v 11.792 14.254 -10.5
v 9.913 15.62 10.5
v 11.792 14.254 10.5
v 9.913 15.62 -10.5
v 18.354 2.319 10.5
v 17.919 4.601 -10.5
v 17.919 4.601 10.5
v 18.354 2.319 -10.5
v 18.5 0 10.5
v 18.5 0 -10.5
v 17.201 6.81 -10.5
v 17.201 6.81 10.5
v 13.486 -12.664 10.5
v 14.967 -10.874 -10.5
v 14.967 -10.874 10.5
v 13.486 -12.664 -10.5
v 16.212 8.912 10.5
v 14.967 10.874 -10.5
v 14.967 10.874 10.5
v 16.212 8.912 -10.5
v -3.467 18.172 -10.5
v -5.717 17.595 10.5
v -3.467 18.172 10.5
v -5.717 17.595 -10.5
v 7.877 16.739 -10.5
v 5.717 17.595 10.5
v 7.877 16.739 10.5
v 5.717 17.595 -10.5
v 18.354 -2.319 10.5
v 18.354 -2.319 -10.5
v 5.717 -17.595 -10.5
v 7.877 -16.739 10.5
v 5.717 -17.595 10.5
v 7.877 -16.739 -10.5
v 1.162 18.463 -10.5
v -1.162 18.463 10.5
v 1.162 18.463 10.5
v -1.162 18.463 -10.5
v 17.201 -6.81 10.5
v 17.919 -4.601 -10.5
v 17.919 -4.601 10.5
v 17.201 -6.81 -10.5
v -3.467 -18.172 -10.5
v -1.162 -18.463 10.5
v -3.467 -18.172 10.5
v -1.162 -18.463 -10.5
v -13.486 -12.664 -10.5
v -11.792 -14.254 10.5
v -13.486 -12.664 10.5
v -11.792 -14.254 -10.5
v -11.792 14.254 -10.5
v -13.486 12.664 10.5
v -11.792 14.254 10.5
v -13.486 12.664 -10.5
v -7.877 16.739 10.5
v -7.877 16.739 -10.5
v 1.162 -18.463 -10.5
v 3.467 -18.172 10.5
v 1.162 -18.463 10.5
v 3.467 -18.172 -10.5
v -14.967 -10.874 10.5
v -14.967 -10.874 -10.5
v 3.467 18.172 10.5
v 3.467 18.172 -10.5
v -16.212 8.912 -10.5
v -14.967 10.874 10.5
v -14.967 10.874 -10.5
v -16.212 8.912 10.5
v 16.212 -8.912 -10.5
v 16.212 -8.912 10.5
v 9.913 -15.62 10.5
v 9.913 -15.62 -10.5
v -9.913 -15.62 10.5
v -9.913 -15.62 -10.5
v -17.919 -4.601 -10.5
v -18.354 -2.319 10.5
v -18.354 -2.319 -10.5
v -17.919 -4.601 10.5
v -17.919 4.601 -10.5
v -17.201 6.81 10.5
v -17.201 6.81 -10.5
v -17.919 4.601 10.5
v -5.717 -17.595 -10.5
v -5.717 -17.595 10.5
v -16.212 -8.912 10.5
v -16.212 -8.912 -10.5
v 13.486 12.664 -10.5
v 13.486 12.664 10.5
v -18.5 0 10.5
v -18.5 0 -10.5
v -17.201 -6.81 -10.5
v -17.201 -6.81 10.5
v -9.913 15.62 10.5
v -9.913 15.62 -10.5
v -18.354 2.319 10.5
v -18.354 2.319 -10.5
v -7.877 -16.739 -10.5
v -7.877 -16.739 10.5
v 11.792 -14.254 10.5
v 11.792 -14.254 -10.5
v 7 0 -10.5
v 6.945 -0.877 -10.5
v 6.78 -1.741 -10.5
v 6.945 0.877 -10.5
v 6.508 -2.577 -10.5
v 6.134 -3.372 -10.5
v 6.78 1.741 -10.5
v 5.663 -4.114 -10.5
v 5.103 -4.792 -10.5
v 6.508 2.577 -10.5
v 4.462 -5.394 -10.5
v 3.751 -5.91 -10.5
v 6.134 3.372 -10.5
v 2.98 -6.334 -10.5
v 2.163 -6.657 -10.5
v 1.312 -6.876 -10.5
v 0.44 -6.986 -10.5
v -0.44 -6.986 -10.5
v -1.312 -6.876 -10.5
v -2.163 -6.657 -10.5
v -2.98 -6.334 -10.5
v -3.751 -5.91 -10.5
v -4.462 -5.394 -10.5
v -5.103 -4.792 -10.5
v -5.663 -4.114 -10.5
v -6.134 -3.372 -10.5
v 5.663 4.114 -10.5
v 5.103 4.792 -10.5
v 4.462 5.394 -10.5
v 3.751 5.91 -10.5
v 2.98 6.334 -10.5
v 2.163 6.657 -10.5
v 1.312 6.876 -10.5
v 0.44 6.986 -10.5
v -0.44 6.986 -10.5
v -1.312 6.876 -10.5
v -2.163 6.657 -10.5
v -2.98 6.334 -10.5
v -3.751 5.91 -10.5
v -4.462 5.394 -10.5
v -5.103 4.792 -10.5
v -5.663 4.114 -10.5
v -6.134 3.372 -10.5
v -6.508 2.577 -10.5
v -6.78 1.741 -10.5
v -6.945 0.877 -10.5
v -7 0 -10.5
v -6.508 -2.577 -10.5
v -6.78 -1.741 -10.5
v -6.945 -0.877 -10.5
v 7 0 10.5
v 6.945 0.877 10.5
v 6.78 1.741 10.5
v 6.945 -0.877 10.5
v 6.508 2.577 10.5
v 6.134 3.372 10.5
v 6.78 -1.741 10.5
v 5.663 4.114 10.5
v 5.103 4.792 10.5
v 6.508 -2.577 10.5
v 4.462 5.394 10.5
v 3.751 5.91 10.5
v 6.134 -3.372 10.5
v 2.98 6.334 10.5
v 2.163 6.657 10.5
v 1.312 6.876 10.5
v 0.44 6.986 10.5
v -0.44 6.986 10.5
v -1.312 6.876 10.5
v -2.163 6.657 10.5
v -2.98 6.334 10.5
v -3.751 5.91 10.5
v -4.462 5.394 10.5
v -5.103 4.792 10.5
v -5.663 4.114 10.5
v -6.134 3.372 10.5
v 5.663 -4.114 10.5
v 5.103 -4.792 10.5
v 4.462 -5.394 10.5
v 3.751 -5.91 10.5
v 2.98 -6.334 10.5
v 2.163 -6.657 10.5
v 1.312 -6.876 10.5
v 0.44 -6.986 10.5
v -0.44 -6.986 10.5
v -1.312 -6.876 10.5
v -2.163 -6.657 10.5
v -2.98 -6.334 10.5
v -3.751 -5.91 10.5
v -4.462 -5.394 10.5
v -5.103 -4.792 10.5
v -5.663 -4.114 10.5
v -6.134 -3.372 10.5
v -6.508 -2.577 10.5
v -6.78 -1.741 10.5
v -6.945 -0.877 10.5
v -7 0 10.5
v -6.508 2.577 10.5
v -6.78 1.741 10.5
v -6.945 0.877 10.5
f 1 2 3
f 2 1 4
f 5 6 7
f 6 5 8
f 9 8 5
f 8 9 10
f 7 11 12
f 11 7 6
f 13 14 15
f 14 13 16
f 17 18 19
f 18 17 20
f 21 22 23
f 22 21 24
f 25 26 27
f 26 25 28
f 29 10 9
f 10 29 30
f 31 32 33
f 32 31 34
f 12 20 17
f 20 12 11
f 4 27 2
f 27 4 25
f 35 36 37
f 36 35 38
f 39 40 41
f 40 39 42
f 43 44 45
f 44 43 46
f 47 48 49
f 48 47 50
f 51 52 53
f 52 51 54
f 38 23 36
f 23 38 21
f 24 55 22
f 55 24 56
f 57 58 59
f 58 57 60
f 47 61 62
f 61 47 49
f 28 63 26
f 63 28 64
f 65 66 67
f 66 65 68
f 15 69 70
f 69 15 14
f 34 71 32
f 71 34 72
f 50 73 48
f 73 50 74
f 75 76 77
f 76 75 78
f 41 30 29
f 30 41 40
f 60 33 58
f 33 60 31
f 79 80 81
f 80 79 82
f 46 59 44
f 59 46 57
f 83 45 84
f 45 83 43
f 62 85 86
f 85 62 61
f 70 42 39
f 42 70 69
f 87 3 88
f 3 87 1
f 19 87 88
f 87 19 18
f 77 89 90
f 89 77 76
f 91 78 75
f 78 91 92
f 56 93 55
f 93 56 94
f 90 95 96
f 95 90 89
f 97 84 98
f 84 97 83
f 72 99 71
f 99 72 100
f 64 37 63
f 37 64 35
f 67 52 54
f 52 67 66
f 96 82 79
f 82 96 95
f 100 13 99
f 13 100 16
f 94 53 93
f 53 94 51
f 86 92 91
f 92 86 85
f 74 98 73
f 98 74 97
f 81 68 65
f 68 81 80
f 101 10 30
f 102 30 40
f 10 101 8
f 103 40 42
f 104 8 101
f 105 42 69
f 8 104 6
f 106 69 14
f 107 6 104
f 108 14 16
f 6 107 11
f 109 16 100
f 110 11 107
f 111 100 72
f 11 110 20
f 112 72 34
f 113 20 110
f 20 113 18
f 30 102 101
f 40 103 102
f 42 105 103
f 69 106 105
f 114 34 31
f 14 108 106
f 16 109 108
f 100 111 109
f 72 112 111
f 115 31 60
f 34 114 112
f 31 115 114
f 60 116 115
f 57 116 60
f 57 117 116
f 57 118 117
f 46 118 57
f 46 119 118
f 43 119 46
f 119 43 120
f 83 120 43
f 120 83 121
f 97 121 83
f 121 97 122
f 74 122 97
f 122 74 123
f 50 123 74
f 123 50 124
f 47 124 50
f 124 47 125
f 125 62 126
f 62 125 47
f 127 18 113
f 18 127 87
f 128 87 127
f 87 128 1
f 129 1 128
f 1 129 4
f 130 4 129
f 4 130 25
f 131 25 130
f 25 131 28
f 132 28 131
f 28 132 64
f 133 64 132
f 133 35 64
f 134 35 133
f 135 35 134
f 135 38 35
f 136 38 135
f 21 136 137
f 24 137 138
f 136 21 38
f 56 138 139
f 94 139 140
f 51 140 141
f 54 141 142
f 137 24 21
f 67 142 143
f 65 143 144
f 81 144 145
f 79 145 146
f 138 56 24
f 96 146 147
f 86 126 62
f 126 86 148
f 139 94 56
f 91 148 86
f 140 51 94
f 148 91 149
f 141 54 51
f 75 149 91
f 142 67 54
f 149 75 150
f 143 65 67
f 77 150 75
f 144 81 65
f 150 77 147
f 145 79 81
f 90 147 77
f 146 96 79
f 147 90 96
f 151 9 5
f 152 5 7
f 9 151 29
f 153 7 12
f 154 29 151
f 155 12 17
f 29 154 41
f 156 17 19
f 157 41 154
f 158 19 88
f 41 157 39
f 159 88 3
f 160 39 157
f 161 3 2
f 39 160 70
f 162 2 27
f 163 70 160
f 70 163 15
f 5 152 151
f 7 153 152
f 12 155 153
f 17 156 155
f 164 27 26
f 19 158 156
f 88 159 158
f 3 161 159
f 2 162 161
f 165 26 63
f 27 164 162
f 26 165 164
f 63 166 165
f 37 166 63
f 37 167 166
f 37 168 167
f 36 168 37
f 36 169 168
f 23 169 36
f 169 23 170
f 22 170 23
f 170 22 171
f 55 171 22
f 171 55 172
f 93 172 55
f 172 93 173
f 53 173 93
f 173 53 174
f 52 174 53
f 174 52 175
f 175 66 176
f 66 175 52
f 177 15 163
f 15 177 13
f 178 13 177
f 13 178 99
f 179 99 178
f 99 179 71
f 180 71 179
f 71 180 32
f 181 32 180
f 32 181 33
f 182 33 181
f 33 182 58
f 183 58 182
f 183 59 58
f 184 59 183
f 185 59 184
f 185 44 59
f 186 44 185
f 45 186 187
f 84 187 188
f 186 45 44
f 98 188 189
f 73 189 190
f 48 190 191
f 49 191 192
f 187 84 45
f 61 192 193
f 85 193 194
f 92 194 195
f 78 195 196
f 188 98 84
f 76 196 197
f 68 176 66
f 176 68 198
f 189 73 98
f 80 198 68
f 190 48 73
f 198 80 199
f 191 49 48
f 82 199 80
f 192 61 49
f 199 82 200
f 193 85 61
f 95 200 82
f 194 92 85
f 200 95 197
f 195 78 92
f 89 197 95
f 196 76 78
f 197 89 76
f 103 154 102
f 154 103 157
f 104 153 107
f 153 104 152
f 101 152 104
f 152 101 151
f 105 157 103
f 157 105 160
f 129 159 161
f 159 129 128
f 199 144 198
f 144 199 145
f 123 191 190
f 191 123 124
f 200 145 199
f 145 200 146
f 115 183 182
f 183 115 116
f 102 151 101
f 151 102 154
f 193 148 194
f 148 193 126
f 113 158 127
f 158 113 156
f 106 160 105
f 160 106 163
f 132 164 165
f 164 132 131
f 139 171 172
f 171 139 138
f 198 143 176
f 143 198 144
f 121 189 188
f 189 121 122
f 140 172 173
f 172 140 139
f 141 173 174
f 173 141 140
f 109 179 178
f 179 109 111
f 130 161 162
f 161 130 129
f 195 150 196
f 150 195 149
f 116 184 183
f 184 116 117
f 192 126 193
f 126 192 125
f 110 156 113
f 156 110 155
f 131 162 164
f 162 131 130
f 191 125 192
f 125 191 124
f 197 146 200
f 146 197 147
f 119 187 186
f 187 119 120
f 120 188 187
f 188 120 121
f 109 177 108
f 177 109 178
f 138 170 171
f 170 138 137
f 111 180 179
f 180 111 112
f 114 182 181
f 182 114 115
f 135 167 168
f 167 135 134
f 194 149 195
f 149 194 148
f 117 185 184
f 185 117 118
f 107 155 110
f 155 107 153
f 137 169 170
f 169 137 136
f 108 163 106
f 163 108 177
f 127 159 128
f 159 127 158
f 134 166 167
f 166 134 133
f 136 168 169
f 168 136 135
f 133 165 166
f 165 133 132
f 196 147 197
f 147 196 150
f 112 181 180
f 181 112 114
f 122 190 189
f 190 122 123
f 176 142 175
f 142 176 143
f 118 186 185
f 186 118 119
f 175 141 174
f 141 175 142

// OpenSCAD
$fn = 50;


difference() {
	union() {
		translate(v = [0, 0, -10.5000000000]) {
			cylinder(h = 21, r = 18.5000000000);
		}
	}
	union() {
		translate(v = [0, 0, -100.0000000000]) {
			cylinder(h = 200, r = 7);
		}
	}
}
